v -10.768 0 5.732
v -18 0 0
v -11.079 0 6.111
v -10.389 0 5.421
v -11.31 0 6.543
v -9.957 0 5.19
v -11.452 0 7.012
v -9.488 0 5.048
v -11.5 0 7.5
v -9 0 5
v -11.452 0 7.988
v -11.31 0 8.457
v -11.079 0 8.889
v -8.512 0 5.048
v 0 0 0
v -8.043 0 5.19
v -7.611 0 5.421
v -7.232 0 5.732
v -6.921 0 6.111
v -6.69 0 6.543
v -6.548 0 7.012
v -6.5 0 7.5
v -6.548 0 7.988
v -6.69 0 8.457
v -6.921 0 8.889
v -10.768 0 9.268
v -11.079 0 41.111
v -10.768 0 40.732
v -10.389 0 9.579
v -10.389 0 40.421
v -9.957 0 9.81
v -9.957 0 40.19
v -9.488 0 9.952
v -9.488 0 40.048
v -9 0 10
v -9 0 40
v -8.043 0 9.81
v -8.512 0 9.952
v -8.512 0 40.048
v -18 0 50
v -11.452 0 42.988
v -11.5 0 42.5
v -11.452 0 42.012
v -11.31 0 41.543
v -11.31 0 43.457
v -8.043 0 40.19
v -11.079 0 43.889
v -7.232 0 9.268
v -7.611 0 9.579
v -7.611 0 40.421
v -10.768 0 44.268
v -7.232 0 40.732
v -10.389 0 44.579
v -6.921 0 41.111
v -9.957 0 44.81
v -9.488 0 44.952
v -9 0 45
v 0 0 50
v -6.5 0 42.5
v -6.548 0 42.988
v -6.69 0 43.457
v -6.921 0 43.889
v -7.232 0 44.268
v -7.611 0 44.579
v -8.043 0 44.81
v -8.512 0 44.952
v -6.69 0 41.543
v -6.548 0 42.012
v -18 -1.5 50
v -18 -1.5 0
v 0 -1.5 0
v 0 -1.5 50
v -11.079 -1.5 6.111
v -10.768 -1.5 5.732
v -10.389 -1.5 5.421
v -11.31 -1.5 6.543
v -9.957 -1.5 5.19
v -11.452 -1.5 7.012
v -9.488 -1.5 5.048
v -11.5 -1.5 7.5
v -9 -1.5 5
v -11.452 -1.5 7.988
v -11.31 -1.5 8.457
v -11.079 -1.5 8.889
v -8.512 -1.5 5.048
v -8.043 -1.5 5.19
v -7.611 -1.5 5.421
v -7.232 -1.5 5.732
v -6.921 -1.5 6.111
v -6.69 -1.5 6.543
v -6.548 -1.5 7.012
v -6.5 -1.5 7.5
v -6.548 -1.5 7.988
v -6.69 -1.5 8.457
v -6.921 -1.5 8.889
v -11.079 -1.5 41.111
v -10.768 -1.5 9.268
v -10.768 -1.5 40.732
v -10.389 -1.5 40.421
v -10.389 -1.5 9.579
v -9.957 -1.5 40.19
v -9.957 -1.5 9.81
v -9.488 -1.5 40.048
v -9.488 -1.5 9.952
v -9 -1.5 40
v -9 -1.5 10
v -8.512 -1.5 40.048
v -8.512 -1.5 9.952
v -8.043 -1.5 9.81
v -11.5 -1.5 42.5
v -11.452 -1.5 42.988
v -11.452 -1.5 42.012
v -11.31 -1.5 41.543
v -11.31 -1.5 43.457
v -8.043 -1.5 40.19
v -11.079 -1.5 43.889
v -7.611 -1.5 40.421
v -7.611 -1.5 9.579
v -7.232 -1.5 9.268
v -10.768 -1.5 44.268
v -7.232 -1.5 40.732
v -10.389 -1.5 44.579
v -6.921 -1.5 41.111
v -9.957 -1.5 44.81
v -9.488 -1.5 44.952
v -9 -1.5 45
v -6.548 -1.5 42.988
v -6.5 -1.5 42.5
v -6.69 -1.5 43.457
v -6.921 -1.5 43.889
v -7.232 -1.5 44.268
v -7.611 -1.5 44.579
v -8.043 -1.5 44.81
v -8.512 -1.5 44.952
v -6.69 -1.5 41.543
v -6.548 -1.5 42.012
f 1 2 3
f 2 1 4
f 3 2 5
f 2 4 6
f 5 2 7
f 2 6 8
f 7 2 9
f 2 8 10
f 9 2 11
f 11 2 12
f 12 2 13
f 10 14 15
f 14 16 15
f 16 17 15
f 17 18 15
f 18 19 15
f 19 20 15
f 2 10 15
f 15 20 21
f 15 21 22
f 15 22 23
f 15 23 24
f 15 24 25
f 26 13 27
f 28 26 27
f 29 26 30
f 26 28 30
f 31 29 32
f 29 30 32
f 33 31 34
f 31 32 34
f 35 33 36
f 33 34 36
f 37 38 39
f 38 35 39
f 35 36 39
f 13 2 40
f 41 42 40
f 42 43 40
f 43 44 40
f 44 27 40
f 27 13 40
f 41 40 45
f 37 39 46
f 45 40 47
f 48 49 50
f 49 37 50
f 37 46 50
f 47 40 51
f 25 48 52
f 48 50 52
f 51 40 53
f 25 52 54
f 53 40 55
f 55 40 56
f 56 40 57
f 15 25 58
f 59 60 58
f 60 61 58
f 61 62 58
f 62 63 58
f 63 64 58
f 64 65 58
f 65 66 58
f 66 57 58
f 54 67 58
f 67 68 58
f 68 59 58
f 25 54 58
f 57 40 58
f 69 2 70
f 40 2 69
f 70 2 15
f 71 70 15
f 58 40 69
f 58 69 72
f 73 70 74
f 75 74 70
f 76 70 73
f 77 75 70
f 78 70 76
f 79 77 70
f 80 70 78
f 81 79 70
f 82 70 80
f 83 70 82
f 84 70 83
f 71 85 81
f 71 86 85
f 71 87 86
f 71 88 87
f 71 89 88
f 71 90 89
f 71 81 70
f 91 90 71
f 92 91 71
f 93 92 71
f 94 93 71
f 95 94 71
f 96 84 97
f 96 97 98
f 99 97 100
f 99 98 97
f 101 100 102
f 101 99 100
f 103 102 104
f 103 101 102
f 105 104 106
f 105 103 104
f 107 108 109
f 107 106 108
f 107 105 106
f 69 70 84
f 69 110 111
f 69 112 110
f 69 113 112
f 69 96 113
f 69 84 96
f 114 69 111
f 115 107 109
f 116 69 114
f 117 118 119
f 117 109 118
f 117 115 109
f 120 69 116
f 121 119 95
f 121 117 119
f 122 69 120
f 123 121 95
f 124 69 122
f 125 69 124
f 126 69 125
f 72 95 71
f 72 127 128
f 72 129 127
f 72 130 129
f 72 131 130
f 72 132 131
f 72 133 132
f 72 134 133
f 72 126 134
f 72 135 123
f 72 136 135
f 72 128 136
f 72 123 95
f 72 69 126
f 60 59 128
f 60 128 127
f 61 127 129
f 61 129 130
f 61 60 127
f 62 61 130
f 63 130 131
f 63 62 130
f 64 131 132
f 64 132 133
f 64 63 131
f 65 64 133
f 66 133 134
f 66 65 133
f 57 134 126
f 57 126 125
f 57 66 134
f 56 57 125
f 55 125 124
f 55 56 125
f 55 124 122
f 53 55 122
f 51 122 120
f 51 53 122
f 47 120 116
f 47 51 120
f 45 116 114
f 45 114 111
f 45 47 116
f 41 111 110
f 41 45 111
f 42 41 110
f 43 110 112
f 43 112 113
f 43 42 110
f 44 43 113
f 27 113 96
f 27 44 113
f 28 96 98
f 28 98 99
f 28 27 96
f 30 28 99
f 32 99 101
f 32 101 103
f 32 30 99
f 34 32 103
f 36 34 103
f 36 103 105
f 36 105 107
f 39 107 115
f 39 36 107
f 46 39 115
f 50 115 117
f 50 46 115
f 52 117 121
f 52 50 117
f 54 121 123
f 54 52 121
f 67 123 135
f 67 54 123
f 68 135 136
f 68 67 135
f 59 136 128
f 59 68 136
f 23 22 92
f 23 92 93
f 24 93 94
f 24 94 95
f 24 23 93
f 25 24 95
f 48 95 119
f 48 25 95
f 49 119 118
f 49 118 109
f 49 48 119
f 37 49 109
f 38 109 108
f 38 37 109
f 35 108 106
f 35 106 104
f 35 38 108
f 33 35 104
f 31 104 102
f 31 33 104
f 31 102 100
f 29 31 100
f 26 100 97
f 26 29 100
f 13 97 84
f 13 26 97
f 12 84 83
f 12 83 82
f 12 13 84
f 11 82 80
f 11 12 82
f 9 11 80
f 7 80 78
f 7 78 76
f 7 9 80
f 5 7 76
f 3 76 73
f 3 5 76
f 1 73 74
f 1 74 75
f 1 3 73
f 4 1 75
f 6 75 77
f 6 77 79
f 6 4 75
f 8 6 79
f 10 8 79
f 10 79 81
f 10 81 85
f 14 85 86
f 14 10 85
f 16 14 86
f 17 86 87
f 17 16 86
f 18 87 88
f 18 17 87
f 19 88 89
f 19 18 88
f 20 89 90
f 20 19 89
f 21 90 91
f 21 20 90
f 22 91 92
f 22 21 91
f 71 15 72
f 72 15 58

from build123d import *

# Parameters (mm, degrees)
F0_W     = 18
F0_H     = 50
F0_R     = 2.5
F1_DEPTH = 1.5


# Not quite as in the source:
# - a feature names something its author has since deleted; it is built from what else it names


with BuildPart() as f1:
    # F0 (on Front) → F1 (new body)
    with BuildSketch(Plane.XZ):
        with Locations((-9, 25)):
            Rectangle(F0_W, F0_H)
        with Locations((-9, 7.5)):
            Circle(F0_R, mode=Mode.SUBTRACT)
        with Locations((-9, 42.5)):
            Circle(F0_R, mode=Mode.SUBTRACT)
    extrude(amount=F1_DEPTH)


solid = f1.part
